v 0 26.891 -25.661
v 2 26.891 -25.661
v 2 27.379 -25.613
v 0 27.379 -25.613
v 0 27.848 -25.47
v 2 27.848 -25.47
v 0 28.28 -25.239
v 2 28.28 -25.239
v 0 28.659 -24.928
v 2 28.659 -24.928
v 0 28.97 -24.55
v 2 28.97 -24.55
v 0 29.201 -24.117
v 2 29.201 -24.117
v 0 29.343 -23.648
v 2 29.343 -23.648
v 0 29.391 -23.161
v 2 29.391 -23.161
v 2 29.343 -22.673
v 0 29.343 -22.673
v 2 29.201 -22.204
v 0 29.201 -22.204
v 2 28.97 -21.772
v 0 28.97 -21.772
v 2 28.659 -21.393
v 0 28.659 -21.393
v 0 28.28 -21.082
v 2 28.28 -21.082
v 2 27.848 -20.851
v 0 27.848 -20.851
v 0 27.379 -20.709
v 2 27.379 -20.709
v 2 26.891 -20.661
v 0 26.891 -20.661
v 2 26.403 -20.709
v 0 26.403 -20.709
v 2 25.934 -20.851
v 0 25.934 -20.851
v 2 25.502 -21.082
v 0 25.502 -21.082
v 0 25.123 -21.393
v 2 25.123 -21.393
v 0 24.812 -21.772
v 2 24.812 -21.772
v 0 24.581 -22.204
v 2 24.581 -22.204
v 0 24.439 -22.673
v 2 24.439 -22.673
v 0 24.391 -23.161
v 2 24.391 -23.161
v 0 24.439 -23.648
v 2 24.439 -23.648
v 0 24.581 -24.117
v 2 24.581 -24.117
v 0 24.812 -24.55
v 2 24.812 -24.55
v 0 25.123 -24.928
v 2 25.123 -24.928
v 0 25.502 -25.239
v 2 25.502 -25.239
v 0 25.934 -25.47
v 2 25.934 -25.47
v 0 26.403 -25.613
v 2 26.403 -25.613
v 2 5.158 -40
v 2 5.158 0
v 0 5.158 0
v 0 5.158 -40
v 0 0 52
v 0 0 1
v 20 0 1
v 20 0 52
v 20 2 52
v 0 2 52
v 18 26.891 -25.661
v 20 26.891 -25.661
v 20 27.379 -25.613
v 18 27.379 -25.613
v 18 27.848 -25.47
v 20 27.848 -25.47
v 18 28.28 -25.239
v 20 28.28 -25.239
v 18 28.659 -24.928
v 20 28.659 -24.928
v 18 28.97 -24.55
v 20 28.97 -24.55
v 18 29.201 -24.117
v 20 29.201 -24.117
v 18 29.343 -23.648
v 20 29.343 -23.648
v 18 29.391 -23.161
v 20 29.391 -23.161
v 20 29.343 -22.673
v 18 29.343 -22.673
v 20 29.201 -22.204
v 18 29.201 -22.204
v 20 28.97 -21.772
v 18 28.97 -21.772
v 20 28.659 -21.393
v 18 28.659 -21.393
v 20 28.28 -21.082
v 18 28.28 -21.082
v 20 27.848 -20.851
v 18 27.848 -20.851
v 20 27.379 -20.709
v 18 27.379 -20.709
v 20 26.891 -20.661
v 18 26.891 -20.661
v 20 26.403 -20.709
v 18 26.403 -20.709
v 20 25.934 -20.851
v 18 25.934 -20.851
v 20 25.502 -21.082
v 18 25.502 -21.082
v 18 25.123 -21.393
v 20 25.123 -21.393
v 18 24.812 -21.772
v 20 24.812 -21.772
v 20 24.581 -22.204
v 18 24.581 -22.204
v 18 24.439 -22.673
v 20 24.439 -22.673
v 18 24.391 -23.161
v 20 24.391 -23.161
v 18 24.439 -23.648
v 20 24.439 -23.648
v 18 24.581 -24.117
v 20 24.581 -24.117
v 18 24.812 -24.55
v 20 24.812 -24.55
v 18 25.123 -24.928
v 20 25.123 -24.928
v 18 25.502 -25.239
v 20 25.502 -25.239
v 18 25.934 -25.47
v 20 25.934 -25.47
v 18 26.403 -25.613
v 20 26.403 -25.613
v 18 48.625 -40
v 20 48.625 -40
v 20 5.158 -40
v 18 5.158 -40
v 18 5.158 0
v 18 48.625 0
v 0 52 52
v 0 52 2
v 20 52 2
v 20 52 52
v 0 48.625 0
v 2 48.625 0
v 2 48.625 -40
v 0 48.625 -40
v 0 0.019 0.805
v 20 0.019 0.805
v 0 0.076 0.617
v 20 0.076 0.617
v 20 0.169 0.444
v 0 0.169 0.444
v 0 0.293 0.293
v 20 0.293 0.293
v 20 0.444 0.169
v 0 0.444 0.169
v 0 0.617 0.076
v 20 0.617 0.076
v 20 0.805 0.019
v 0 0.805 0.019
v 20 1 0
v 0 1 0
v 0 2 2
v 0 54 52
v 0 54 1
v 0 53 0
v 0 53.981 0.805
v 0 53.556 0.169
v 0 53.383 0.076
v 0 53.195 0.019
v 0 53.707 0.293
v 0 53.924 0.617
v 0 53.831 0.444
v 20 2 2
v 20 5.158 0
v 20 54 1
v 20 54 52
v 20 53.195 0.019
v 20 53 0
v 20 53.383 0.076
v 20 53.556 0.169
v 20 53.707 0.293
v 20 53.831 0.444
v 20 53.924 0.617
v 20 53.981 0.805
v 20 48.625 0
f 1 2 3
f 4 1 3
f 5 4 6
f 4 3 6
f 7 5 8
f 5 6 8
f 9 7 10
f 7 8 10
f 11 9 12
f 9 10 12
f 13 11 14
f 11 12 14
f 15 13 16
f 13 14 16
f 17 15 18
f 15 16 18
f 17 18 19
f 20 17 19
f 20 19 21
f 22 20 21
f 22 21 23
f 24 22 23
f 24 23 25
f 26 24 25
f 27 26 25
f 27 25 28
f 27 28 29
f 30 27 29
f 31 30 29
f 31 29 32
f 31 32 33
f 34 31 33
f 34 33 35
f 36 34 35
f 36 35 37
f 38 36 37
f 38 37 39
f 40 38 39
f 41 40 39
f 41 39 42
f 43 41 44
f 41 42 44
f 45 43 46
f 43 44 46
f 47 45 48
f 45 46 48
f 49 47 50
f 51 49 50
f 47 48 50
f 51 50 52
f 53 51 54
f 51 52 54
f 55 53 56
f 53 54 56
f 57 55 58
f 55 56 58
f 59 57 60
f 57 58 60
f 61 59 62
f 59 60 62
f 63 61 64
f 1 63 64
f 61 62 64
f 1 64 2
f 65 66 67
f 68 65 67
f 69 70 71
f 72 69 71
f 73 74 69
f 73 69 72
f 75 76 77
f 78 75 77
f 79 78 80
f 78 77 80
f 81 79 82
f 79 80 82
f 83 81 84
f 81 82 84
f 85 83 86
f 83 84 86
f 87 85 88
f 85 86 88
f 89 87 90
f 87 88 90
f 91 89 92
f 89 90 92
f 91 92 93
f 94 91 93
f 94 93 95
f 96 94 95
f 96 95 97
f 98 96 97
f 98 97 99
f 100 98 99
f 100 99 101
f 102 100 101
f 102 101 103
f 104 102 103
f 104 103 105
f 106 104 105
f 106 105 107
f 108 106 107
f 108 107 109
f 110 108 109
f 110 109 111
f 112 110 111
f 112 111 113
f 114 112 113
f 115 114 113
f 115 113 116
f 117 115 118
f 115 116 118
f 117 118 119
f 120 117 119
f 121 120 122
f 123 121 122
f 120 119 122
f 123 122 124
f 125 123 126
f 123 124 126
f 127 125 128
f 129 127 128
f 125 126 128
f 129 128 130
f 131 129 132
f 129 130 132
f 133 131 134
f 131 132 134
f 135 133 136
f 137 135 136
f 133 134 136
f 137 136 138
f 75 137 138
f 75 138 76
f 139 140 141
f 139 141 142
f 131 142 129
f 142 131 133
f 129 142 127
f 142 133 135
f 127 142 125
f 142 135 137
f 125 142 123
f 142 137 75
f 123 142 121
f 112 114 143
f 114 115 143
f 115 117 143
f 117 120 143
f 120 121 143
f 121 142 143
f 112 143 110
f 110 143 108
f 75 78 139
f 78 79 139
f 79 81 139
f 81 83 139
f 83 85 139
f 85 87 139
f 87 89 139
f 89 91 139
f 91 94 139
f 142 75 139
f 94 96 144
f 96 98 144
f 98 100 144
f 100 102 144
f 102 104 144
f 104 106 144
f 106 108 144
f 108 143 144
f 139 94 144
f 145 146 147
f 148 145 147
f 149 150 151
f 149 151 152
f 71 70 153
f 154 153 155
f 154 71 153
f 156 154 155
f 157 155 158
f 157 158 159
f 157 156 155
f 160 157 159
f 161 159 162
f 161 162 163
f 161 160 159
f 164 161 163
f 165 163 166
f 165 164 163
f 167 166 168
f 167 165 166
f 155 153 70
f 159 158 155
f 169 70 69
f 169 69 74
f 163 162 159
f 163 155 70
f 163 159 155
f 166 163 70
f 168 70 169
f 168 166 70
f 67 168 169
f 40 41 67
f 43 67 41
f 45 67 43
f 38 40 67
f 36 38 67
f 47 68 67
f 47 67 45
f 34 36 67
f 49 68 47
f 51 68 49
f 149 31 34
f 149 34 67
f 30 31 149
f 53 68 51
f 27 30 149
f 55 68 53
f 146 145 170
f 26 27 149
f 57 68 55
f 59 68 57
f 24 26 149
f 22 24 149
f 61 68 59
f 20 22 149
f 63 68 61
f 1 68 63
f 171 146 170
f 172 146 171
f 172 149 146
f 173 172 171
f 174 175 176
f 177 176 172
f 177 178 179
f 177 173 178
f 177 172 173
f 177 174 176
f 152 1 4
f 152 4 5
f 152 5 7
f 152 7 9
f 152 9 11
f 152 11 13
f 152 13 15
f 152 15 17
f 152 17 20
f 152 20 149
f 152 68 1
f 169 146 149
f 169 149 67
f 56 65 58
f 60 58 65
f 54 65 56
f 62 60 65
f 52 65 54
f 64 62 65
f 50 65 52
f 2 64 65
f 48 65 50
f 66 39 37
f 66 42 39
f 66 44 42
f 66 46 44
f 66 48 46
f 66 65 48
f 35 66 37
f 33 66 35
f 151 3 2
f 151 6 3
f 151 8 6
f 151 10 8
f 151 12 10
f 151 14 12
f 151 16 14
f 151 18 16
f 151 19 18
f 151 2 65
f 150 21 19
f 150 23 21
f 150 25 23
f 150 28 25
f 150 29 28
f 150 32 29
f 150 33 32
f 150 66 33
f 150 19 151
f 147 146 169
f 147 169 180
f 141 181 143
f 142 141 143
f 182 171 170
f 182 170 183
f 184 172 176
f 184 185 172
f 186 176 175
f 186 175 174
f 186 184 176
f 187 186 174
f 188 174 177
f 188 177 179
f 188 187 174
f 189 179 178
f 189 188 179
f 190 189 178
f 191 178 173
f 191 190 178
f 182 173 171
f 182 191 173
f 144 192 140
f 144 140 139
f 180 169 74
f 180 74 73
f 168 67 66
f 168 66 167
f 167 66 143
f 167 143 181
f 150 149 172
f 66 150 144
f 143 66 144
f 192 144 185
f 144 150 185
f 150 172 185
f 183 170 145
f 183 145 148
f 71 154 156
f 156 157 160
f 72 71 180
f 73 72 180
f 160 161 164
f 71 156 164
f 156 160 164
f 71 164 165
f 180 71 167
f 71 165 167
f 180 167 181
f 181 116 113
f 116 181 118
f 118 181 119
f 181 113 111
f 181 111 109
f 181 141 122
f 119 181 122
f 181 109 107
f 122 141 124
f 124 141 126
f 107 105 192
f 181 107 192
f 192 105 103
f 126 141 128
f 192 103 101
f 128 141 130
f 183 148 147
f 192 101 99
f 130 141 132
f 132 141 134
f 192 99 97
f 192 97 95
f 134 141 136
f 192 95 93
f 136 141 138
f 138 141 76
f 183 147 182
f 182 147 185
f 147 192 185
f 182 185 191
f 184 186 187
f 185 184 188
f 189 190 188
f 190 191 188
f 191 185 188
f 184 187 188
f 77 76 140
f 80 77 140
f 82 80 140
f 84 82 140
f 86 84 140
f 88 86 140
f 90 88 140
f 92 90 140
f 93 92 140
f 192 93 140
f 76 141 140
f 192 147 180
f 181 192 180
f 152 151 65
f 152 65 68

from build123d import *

# Parameters (mm, degrees)
SKETCH1_W           = 20
SKETCH1_H           = 54
BOSS_EXTRUDE1_DEPTH = 2
SKETCH2_W           = 20
SKETCH2_H           = 2
BOSS_EXTRUDE2_DEPTH = 50
FILLET1_R           = 1
SKETCH3_W           = 2
SKETCH3_H           = 43.466929313
BOSS_EXTRUDE3_DEPTH = 40
SKETCH4_R           = 2.5
CUT_EXTRUDE1_DEPTH  = 78.588658965


with BuildPart() as part:
    # Sketch1 → Boss-Extrude1 (new body)
    with BuildSketch(Plane.XY):
        with Locations((10, 27)):
            Rectangle(SKETCH1_W, SKETCH1_H)
    extrude(amount=BOSS_EXTRUDE1_DEPTH)

    # Sketch2 → Boss-Extrude2 (add)
    with BuildSketch(Plane.XY.offset(2)):
        with Locations((10, 53)):
            Rectangle(SKETCH2_W, SKETCH2_H)
        with Locations((10, 1)):
            Rectangle(SKETCH2_W, SKETCH2_H)
    extrude(amount=BOSS_EXTRUDE2_DEPTH)

    # Fillet1
    fillet1_edges = [part.edges().sort_by_distance(p)[0] for p in [
        (10, 54, 0),
        (10, 0, 0),
    ]]
    fillet(fillet1_edges, radius=FILLET1_R)

    # Sketch3 → Boss-Extrude3 (add)
    with BuildSketch(Plane(origin=(0, 0, 0), x_dir=(-1, 0, 0), z_dir=(0, 0, -1))):
        with Locations((-19, 26.891060328)):
            Rectangle(SKETCH3_W, SKETCH3_H)
        with Locations((-1, 26.891060328)):
            Rectangle(SKETCH3_W, SKETCH3_H)
    extrude(amount=BOSS_EXTRUDE3_DEPTH)

    # Sketch4 → Cut-Extrude1 (cut, through all)
    with BuildSketch(Plane(origin=(20, 0, 0), x_dir=(0, 0, -1), z_dir=(1, 0, 0))):
        with Locations((23.160609429, 26.891060328)):
            Circle(SKETCH4_R)
    extrude(amount=-CUT_EXTRUDE1_DEPTH, mode=Mode.SUBTRACT)


solid = part.part
